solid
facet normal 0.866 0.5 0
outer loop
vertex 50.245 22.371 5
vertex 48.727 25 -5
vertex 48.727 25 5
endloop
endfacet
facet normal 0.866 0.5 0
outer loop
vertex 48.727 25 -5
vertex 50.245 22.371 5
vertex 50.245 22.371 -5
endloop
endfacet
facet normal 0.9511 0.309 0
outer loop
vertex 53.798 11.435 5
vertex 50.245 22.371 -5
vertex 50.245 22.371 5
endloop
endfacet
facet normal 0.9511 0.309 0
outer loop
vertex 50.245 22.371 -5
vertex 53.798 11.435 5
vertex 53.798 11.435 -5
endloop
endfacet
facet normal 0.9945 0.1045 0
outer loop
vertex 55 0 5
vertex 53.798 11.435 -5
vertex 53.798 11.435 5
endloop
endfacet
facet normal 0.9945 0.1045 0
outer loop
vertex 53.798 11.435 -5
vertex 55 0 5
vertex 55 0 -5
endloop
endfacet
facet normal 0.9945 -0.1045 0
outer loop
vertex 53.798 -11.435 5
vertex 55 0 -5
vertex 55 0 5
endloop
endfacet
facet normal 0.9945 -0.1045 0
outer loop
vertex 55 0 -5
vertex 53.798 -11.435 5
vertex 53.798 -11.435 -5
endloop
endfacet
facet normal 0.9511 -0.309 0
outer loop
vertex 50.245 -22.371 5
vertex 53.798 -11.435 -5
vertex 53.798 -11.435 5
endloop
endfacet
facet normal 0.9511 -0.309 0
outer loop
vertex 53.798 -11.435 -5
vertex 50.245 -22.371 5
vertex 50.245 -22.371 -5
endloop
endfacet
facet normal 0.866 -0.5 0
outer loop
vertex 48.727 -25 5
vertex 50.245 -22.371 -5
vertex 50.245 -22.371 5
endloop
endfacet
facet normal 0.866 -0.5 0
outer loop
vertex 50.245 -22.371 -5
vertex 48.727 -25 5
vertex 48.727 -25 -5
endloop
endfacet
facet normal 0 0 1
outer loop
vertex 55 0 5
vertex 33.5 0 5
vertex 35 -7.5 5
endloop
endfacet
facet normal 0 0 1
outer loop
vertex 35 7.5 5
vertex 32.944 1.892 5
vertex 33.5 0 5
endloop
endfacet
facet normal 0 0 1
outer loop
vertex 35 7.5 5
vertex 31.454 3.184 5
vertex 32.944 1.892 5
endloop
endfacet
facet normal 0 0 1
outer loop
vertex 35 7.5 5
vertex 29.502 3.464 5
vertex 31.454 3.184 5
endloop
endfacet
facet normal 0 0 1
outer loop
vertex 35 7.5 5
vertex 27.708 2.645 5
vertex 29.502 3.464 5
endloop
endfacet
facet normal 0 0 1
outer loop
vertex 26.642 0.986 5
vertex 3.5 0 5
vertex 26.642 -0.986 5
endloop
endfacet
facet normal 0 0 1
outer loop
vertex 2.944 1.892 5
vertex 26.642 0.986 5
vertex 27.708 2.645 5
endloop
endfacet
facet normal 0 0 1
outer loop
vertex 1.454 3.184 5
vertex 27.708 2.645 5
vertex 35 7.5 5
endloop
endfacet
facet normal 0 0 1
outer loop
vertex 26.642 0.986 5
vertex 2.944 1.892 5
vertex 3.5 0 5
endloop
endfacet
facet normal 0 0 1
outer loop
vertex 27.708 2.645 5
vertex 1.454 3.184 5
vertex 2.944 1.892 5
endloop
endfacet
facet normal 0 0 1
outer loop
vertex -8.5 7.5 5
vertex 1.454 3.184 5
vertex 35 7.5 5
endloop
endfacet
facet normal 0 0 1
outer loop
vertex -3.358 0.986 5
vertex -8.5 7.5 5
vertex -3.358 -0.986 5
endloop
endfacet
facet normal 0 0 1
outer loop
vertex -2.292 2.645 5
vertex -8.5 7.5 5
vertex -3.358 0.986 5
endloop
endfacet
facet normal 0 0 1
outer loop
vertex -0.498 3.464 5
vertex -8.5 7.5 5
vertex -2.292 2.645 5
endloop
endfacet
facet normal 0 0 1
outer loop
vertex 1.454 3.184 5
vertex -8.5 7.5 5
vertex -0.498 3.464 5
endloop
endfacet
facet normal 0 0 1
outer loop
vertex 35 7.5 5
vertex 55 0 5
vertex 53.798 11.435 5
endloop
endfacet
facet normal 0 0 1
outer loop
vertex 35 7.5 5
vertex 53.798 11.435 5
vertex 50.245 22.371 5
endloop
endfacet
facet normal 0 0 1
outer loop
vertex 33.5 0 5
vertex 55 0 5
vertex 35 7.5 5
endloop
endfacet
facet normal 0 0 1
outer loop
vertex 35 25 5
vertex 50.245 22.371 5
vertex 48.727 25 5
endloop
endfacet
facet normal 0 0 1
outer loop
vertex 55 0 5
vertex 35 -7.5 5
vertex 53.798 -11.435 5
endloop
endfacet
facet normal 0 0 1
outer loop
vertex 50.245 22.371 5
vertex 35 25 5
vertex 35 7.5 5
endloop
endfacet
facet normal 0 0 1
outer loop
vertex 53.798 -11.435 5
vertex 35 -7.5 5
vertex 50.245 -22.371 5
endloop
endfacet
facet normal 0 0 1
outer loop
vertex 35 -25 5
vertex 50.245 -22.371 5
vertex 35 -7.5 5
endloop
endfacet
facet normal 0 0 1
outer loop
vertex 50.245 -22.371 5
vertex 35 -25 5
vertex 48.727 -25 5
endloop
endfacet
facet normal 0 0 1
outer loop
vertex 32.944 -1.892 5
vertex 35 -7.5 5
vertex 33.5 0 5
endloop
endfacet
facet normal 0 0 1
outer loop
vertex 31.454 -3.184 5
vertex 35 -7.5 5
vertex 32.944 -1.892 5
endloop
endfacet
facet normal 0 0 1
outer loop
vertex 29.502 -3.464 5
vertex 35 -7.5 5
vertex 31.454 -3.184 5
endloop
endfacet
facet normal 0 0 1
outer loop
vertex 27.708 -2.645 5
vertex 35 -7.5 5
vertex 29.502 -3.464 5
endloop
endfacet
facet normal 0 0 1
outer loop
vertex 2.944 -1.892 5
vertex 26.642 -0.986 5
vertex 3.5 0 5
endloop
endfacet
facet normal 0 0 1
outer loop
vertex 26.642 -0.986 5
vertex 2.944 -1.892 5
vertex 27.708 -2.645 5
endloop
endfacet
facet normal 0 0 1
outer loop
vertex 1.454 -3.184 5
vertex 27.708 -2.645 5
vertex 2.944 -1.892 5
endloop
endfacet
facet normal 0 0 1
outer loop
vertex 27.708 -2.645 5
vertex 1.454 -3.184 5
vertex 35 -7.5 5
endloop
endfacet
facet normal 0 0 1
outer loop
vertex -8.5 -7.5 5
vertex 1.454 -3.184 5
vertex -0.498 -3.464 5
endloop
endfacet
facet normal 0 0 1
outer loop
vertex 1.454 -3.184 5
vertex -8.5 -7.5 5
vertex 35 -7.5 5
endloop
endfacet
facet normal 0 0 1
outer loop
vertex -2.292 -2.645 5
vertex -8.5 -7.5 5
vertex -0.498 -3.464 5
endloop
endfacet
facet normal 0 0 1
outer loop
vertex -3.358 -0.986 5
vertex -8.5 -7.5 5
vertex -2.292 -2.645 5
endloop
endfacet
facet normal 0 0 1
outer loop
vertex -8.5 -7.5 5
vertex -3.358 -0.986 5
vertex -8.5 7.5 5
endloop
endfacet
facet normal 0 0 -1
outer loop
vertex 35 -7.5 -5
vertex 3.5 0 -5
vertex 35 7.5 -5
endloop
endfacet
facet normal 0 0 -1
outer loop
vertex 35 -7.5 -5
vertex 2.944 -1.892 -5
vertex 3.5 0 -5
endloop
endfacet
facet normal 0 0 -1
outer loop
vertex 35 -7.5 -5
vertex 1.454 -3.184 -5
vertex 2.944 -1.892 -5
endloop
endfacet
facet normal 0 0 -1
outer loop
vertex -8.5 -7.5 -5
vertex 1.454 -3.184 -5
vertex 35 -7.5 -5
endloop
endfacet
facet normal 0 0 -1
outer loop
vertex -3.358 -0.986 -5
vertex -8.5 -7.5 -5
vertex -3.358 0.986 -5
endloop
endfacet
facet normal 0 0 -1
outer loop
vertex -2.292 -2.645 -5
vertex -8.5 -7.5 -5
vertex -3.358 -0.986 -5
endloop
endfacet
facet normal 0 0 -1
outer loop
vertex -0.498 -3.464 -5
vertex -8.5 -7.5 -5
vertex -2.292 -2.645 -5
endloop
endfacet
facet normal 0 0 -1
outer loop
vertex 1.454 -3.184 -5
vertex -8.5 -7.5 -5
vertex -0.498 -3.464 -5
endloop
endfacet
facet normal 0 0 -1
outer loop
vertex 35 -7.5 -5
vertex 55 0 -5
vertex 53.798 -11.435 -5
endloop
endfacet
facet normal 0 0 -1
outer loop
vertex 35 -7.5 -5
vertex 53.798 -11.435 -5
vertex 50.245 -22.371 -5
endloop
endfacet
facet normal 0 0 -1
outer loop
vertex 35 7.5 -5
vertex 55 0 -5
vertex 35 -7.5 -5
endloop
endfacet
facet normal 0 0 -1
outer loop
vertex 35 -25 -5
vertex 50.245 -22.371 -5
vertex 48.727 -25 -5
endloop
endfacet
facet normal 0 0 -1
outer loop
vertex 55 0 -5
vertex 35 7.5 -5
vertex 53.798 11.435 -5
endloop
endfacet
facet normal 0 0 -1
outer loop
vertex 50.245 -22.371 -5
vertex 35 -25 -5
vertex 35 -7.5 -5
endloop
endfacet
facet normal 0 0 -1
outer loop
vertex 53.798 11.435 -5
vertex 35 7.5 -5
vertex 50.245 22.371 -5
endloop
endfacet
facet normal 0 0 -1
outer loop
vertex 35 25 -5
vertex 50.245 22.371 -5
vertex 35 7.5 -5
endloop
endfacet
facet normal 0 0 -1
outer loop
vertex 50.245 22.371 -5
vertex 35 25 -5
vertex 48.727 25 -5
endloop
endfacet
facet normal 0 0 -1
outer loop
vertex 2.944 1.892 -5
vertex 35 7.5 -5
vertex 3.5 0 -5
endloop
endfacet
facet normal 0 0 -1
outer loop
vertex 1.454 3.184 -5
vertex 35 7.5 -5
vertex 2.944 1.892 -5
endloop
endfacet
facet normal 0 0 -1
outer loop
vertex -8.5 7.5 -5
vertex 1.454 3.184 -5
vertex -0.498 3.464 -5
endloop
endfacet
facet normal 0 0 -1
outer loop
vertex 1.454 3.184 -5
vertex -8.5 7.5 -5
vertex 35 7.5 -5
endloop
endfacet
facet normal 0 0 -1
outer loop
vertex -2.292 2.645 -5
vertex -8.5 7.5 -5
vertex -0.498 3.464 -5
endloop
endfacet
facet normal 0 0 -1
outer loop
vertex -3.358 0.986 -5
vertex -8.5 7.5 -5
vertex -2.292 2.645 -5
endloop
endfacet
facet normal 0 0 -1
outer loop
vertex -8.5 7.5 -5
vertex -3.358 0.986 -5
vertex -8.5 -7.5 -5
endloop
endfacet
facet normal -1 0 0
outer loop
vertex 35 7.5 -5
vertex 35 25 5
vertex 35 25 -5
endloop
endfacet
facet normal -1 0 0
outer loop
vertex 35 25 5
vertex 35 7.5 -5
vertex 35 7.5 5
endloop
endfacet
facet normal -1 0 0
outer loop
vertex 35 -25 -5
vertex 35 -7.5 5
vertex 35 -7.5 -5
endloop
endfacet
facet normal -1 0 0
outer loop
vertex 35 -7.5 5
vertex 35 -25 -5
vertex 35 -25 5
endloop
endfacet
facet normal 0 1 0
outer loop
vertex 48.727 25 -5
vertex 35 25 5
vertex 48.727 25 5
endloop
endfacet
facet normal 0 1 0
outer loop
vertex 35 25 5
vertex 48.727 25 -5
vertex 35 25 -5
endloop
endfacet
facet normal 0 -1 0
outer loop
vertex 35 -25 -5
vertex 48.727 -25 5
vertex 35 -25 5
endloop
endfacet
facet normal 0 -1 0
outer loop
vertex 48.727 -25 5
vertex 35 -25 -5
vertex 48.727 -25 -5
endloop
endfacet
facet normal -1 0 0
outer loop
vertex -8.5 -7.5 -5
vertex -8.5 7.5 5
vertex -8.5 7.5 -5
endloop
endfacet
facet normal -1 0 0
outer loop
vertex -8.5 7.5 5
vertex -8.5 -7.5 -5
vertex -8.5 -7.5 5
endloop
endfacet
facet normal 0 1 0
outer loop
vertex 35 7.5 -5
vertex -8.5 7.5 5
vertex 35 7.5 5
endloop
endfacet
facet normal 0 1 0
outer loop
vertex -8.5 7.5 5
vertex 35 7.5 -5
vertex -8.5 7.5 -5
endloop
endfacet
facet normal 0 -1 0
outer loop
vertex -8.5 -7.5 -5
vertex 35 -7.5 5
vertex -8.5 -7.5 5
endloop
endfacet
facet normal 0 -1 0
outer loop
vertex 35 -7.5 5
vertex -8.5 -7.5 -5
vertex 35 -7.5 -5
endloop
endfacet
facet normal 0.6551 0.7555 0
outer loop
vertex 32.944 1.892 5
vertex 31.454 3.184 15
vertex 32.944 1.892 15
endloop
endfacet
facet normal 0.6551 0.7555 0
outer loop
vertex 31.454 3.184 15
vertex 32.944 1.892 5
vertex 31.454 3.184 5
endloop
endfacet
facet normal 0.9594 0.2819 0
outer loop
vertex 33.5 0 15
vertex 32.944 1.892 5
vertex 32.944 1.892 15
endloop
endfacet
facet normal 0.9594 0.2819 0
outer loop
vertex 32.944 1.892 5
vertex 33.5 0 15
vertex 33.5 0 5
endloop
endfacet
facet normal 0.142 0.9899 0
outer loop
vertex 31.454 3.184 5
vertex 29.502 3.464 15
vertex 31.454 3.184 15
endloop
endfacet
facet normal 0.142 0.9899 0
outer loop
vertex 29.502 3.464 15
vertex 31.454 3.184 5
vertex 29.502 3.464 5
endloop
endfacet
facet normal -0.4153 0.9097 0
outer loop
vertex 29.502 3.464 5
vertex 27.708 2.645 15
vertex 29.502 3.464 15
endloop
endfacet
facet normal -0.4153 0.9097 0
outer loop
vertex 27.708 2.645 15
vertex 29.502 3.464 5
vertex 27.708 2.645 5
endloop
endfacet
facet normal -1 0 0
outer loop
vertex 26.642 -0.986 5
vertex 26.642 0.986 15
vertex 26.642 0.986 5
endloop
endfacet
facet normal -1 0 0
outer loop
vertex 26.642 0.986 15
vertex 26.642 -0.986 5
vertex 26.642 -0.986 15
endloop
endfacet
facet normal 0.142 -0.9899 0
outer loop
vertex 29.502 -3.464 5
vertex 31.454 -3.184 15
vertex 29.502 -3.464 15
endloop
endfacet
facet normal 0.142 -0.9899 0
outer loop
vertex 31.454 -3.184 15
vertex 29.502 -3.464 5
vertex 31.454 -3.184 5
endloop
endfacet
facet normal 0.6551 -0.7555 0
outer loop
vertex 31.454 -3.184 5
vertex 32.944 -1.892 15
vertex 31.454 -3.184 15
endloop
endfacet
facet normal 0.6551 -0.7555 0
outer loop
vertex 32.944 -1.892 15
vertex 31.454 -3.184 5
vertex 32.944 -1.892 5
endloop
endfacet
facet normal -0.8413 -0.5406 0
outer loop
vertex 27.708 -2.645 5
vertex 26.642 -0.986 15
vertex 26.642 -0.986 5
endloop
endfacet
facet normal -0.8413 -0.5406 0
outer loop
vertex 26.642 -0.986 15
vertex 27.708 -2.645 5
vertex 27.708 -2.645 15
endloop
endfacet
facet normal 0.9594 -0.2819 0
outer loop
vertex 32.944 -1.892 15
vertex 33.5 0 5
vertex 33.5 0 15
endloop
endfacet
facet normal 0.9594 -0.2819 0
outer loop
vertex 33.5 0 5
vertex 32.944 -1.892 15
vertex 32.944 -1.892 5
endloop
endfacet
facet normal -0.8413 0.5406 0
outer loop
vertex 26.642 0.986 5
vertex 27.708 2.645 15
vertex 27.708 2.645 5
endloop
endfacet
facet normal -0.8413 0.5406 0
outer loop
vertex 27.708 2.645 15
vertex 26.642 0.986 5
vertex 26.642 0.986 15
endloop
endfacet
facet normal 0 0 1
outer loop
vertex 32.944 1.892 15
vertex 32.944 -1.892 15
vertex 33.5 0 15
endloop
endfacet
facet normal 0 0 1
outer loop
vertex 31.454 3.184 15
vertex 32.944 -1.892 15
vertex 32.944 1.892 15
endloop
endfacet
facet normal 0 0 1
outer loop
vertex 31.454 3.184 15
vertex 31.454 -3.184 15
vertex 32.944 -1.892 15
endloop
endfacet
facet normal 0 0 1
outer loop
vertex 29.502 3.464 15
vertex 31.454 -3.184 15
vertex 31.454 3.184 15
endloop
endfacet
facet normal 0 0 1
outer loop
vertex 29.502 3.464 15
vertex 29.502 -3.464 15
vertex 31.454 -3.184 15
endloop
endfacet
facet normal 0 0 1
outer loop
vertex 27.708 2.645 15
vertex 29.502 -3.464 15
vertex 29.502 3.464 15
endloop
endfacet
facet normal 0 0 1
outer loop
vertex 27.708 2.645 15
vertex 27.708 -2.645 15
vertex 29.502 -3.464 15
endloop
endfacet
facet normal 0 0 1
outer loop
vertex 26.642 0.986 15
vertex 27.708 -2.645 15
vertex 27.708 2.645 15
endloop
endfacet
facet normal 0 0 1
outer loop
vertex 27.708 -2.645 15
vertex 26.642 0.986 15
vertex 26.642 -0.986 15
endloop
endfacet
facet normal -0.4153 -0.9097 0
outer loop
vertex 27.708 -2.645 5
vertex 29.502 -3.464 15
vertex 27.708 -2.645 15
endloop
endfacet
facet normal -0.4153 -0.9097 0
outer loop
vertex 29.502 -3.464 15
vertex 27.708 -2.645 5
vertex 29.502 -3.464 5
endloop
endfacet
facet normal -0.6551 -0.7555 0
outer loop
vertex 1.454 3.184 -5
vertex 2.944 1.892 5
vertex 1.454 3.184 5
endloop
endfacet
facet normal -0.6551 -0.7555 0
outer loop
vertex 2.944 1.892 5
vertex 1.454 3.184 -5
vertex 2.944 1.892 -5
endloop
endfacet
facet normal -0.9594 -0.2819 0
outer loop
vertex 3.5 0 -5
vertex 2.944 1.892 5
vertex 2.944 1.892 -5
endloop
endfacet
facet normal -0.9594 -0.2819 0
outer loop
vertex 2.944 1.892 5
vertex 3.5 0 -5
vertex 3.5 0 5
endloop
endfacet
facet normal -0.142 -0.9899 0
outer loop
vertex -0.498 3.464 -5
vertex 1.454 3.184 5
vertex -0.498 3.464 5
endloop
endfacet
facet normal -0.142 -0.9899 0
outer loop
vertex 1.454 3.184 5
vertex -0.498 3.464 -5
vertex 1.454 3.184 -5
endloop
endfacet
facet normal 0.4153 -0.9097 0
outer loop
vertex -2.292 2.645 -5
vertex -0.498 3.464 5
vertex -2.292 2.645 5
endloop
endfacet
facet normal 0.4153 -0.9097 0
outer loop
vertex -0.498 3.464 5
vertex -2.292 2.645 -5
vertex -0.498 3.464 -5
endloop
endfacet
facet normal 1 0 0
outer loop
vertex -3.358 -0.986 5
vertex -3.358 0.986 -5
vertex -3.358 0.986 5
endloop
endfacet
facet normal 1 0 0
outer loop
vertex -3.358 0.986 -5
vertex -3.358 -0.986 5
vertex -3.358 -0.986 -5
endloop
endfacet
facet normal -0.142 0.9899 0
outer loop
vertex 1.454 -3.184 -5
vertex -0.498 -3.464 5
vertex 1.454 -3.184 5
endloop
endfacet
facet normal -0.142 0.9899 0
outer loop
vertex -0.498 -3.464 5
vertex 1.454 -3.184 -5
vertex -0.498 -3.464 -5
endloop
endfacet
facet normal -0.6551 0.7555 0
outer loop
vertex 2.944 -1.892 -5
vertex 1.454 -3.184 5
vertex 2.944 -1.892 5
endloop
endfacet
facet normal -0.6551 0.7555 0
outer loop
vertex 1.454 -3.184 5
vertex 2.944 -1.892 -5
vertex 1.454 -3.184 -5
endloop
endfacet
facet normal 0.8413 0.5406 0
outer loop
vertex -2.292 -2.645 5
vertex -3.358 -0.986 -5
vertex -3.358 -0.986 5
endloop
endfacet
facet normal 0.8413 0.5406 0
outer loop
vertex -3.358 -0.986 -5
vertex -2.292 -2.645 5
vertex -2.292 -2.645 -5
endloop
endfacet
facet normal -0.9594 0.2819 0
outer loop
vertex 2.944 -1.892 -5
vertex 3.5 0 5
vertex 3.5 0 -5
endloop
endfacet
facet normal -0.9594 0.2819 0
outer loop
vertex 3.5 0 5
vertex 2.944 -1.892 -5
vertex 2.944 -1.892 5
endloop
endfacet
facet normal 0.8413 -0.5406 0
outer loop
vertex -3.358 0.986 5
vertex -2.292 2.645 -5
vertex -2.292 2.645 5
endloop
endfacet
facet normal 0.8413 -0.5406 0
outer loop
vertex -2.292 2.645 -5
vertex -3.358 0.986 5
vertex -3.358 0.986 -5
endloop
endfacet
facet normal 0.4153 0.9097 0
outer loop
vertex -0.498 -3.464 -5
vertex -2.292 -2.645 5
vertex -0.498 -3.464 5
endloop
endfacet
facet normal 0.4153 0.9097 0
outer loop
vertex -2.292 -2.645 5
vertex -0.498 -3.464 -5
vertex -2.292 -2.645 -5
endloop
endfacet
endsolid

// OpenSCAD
module crank(){
    H = 10;    // Altura de la palanca (Z)
    // Contrapesa
    R = 55;    // Largo total de la palanca (X)
    Wc = 50;    // Ancho de contrapesa (Y)
    Lc = 20;    // Seccion de contrapesa (X)
    // Palanca 
    Wp = 15;    // Ancho del brazo de la  palanca
    e = 5;     // Sobresaliente opuesta a la contrapesa
    // Orificios para ejes
    rh1 = 3.5;  // Radio orificio eje central
    rh2 = 3.5;  // Radio eje biela
    dh12 = 30;  // Separacion entre orificio central y eje biela

    difference(){
        union(){
            // Contrapesa
            intersection(){
                cylinder(r = R, h = H, center = true);
                translate([R-Lc/2,0,0])
                    cube([Lc,Wc,H+1], center = true);
            }
            translate([(R-Lc-rh1-e)/2,0,0])
                cube([R-Lc+rh1+e,Wp,H], center = true);
            
            // Eje de biela
            translate([dh12,0,H])
                cylinder(r = rh2, h = H, center = true);
        }
        
        // Eje central
        cylinder(r = rh1, h = H, center = true);
    }
}

crank();
